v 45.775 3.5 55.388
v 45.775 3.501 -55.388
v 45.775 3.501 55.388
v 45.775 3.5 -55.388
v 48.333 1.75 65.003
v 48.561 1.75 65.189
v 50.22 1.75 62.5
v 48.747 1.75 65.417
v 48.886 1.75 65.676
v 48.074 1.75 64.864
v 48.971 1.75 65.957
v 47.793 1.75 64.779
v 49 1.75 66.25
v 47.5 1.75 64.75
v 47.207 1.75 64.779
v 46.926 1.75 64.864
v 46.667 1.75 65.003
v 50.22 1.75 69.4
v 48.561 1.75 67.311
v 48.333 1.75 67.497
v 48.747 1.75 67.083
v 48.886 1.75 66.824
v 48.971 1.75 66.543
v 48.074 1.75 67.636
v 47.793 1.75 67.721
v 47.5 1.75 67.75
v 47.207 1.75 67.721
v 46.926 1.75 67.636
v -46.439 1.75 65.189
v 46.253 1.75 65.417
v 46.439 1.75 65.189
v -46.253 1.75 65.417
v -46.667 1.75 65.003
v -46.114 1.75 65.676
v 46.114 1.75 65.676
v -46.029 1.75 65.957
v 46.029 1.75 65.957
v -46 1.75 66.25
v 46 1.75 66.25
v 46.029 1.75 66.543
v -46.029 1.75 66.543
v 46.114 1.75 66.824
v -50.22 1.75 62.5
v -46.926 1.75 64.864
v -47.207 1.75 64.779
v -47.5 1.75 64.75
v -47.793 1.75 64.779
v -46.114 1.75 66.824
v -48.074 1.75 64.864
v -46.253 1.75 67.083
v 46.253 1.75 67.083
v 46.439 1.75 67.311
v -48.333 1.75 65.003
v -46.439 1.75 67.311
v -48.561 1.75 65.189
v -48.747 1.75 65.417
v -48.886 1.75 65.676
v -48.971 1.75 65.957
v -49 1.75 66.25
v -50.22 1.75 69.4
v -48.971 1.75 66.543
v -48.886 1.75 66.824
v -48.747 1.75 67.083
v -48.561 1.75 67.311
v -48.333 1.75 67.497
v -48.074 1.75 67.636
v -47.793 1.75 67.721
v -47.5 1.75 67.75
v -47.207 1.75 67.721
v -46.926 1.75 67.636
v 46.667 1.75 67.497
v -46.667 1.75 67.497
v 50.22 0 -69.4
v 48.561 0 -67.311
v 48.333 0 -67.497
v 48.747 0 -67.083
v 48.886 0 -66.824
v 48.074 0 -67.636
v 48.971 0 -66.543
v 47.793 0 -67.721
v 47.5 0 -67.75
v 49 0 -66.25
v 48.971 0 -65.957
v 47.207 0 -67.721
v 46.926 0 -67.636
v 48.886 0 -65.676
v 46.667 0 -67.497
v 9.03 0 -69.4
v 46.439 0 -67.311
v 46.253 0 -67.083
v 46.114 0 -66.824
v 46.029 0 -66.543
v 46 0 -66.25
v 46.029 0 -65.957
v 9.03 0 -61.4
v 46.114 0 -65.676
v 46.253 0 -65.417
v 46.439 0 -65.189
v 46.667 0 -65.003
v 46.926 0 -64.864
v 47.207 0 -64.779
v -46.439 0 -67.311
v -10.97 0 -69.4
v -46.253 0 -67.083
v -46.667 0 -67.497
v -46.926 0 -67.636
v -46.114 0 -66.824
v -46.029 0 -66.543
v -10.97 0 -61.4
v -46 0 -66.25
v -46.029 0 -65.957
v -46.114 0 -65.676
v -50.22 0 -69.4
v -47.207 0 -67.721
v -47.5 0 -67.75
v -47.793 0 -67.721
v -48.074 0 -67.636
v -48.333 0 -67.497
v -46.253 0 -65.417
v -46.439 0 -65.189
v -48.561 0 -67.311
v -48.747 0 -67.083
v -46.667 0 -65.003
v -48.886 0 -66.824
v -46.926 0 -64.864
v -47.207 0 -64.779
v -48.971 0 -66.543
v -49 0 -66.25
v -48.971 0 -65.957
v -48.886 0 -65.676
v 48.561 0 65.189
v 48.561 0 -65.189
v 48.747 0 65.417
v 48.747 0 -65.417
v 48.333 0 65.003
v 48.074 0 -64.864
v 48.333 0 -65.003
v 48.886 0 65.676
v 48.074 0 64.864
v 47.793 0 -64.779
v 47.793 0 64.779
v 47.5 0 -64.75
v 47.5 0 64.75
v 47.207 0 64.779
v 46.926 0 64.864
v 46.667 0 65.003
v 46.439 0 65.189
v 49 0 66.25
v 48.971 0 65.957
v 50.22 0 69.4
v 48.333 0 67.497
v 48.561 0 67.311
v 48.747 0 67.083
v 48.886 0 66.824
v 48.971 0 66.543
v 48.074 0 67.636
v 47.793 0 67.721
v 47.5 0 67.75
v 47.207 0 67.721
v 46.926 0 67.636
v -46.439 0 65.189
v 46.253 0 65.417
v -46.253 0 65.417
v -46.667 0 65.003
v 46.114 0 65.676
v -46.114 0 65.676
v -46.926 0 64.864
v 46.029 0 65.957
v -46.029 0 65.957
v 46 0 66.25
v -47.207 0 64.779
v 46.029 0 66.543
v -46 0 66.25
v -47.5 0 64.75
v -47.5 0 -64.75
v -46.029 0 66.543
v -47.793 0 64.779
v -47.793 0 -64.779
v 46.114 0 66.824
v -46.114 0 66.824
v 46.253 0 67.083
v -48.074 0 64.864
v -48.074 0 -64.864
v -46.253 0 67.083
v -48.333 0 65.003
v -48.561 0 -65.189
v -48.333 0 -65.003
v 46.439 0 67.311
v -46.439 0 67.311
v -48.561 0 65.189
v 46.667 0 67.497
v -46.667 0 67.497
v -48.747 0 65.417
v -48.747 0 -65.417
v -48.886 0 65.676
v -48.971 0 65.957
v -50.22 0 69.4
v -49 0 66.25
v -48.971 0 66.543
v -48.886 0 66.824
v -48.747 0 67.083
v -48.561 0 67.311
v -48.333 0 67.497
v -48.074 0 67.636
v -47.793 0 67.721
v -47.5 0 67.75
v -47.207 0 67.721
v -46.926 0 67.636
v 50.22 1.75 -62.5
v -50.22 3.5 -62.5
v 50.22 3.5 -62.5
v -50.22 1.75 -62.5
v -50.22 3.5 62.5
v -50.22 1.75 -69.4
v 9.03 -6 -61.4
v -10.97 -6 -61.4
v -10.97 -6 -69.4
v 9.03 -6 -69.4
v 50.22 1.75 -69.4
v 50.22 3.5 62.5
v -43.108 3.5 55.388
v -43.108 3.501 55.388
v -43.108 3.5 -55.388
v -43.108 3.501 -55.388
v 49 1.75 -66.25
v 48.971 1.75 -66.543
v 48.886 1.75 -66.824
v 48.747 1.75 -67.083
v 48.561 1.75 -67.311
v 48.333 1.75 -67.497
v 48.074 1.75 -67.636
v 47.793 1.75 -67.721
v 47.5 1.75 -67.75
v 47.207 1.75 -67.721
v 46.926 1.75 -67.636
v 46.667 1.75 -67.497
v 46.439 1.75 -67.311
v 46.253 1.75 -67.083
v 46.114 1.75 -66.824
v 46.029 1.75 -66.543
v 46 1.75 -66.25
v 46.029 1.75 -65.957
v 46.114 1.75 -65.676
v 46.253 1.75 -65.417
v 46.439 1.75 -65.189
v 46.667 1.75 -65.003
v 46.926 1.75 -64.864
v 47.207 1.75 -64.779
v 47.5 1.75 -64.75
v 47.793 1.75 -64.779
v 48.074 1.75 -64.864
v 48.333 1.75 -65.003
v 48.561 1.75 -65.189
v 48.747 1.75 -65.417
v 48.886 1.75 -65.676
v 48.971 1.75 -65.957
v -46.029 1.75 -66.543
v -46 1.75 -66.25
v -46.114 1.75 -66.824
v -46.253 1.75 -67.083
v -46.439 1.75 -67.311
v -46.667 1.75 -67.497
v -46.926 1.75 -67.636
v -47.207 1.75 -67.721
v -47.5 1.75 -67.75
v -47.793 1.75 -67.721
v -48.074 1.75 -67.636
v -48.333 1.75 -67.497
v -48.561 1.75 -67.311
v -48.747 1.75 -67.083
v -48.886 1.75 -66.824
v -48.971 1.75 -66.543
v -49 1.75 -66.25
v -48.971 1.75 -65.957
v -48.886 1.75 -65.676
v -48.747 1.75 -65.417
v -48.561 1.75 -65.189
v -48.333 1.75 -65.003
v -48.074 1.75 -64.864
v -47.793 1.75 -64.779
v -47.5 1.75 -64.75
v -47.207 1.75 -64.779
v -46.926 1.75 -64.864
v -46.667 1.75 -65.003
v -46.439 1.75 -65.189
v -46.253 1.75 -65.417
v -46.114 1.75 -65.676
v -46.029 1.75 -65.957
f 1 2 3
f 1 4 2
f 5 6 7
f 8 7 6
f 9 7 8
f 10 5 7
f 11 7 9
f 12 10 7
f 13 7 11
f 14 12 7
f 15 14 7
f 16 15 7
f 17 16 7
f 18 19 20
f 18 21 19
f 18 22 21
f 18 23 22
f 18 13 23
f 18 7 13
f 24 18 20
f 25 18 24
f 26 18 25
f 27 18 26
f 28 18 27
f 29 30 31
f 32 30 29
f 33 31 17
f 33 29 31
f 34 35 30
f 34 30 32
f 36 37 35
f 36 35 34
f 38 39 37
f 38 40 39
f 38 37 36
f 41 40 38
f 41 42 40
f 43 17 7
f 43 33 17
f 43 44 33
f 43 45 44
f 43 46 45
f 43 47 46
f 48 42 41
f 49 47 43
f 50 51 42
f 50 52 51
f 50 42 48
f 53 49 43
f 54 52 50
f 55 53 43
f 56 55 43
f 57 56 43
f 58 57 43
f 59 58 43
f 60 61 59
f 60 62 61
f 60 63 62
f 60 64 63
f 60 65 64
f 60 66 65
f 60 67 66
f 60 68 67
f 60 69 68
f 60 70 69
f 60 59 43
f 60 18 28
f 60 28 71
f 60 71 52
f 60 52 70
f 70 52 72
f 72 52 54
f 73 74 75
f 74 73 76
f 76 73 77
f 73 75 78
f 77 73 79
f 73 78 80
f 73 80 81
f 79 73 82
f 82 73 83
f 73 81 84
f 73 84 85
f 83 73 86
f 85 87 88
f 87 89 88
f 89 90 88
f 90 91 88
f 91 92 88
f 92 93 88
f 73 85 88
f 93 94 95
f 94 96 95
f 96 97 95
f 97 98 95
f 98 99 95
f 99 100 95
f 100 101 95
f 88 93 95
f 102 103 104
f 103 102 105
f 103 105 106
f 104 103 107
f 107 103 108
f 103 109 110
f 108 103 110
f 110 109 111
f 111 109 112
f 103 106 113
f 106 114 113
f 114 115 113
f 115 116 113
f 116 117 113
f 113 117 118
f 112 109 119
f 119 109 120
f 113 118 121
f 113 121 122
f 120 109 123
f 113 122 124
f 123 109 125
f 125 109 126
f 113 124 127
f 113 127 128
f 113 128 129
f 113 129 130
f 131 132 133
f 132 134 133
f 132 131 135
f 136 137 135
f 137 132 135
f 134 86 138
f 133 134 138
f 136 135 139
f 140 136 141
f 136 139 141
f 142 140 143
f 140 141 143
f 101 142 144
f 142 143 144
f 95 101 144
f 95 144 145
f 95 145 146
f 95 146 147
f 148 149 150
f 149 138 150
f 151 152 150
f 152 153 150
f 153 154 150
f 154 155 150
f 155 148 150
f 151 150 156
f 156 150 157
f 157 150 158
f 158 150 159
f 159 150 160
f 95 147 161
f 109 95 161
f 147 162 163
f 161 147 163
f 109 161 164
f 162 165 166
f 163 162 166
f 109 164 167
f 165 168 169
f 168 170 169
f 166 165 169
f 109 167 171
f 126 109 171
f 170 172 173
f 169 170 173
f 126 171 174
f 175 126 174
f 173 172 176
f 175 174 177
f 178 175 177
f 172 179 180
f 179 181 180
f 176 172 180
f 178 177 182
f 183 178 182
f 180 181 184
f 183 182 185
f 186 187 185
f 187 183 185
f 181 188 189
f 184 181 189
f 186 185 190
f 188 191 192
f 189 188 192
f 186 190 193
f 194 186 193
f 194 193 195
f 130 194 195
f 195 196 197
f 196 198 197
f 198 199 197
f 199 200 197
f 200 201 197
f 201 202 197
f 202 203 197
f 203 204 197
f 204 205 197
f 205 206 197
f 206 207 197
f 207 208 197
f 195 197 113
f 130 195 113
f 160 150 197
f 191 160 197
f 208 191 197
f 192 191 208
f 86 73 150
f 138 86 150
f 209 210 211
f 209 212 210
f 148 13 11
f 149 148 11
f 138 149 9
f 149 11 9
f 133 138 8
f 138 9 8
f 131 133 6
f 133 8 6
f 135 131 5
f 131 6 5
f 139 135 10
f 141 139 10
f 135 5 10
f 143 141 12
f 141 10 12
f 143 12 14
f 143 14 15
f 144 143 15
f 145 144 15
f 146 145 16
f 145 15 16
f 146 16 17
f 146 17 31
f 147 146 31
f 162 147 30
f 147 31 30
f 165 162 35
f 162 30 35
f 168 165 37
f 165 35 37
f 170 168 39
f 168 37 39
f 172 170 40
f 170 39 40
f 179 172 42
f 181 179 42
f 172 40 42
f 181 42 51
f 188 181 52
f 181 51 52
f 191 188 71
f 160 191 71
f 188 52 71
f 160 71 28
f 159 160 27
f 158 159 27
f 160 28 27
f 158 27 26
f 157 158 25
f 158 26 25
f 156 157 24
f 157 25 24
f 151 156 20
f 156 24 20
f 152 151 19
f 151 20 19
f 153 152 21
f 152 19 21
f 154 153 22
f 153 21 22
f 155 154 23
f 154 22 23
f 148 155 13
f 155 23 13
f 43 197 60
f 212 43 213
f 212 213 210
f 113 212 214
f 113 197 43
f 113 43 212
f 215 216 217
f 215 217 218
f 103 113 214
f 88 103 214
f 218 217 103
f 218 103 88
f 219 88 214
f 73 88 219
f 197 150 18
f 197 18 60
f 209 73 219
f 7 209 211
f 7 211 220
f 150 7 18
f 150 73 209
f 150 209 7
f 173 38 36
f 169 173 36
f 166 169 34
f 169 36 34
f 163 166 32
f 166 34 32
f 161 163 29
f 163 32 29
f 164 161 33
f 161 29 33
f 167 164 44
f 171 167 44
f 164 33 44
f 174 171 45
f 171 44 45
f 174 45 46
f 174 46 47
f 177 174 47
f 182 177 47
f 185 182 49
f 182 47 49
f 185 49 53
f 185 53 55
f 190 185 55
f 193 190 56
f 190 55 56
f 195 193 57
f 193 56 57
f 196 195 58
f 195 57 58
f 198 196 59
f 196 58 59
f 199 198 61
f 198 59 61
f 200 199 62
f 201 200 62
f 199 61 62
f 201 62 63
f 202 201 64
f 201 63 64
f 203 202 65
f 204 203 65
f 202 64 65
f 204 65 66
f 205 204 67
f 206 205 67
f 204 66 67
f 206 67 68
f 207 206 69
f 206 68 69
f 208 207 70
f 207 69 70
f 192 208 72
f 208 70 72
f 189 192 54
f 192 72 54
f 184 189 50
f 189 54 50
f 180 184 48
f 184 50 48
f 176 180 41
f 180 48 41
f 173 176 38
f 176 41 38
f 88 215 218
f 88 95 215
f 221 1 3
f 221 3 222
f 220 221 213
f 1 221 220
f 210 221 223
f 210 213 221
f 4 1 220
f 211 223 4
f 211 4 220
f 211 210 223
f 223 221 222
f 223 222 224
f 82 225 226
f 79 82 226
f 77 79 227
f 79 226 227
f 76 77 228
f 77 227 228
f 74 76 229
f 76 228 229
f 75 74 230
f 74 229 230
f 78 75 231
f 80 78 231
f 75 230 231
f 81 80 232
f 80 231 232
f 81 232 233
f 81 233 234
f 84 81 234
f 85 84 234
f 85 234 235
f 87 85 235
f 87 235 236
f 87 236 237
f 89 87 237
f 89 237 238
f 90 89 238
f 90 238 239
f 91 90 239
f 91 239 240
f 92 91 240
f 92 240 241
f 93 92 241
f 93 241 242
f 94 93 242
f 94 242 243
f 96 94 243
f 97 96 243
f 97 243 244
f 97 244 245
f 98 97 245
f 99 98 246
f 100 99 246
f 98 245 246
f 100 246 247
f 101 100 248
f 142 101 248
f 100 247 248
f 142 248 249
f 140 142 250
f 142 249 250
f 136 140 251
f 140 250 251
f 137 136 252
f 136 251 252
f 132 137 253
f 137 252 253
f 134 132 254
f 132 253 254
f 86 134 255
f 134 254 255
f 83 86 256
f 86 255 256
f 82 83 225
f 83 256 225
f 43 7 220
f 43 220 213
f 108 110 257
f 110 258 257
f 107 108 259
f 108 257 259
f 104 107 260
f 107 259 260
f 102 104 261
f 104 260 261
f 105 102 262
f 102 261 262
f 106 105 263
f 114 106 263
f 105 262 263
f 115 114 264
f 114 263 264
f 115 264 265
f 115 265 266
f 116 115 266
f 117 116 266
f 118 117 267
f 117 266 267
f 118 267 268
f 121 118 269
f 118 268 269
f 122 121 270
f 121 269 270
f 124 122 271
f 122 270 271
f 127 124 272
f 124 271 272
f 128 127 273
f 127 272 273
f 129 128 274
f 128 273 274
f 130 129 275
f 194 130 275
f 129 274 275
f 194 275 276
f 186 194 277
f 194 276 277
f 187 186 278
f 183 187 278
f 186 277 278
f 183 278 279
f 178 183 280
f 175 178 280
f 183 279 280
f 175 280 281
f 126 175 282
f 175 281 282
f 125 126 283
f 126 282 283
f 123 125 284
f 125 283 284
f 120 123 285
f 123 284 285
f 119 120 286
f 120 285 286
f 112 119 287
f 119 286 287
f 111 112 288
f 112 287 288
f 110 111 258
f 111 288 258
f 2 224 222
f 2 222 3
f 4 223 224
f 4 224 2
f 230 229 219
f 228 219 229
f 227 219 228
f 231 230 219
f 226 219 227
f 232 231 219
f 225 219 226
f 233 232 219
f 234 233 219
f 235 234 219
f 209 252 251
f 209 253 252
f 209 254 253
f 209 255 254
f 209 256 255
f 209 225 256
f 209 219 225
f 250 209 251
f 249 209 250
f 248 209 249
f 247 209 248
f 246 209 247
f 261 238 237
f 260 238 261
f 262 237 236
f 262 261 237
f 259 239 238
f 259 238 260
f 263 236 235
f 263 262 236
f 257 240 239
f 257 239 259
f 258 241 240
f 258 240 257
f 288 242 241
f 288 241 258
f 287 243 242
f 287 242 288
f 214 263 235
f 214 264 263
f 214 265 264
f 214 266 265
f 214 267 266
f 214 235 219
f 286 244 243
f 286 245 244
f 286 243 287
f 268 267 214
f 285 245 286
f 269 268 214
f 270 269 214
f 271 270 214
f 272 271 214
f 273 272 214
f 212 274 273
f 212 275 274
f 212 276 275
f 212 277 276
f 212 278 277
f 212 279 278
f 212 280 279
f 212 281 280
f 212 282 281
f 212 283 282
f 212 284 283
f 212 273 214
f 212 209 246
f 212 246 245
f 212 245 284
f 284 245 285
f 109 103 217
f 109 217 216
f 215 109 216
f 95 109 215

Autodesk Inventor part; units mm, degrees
ref_plane "YZ Plane" through (0, 0, 0) normal (1, 0, 0) x (0, 1, 0)
ref_plane "XZ Plane" through (0, 0, 0) normal (0, 1, 0) x (-1, 0, 0)
ref_plane "XY Plane" through (0, 0, 0) normal (0, 0, 1) x (1, 0, 0)
sketch "Sketch1" plane through (0, 0, 0) normal (0, 1, 0) x (-1, 0, 0)
  line L0 (-50.22, 69.4) -> (50.22, 69.4)
  line L1 (50.22, 69.4) -> (50.22, -69.4)
  line L2 (50.22, -69.4) -> (-50.22, -69.4)
  line L3 (-50.22, -69.4) -> (-50.22, 69.4)
  line L4 (-50.22, 69.4) -> (50.22, -69.4) construction
  line L5 (50.22, 69.4) -> (-50.22, -69.4) construction
  point P0 (0, 0)
  dimension "d0" = 100.44
  dimension "d1" = 138.8
extrude "Extrusion1" add sketch "Sketch1" along normal blind 1.75
sketch "Sketch2" plane through (0, 1.75, 0) normal (0, 1, 0) x (1, 0, 0)
  line L0 (-50.22, 69.4) -> (-50.22, -69.4) construction
  line L1 (50.22, -69.4) -> (50.22, 69.4) construction
  line L2 (50.22, -62.5) -> (-50.22, -62.5)
  line L3 (-50.22, -62.5) -> (-50.22, 62.5)
  line L4 (-50.22, 62.5) -> (50.22, 62.5)
  line L5 (50.22, 62.5) -> (50.22, -62.5)
  line L6 (50.22, -62.5) -> (-50.22, 62.5) construction
  line L7 (-50.22, -62.5) -> (50.22, 62.5) construction
  point P0 (0, 0)
  dimension "d4" = 125
extrude "Extrusion2" add sketch "Sketch2" along normal blind 1.75
sketch "Sketch3" plane through (0, 1.75, 0) normal (0, 1, 0) x (1, 0, 0)
  line L0 (50.22, -62.5) -> (-50.22, -62.5) construction
  line L1 (-50.22, -62.5) -> (-50.22, -69.4) construction
  line L2 (-50.22, -69.4) -> (50.22, -69.4) construction
  line L3 (50.22, -69.4) -> (50.22, -62.5) construction
  line L4 (-50.22, 62.5) -> (50.22, 62.5) construction
  line L5 (50.22, 62.5) -> (50.22, 69.4) construction
  line L6 (50.22, 69.4) -> (-50.22, 69.4) construction
  line L7 (-50.22, 69.4) -> (-50.22, 62.5) construction
  line L8 (-50.22, -69.4) -> (50.22, -69.4) construction
  line L9 (0, -69.4) -> (0, 69.4) construction
  line L10 (50.22, 69.4) -> (-50.22, 69.4) construction
  line L11 (0, -66.25) -> (-47.5, -66.25) construction
  line L12 (0, -66.25) -> (47.5, -66.25) construction
  line L13 (-50.22, -62.5) -> (50.22, -62.5) construction
  line L14 (0, -66.25) -> (47.5, -66.25) construction
  circle A0 centre (-47.5, -66.25) radius 1.5
  circle A1 centre (47.5, -66.25) radius 1.5
  line L15 (-50.22, 69.4) -> (-50.22, -69.4) projected
  line L16 (-50.22, 0) -> (50.22, 0) construction
  line L17 (50.22, -62.5) -> (50.22, 62.5) projected
  circle A2 centre (-47.5, 66.25) radius 1.5
  circle A3 centre (47.5, 66.25) radius 1.5
  line L18 (50.22, -62.5) -> (-50.22, -62.5) projected
  line L19 (-50.22, -62.5) -> (-50.22, -69.4) projected
  line L20 (-50.22, -69.4) -> (50.22, -69.4) projected
  line L21 (50.22, -69.4) -> (50.22, -62.5) projected
  line L22 (-50.22, 62.5) -> (50.22, 62.5) projected
  line L23 (50.22, 69.4) -> (-50.22, 69.4) projected
  line L24 (50.22, 62.5) -> (50.22, 69.4) projected
  line L25 (-50.22, 69.4) -> (-50.22, 62.5) projected
  point P0 (0, 0)
  point P1 (-51, 62.5)
  dimension "d7" = 47.5
  dimension "d8" = 47.5
  dimension "d9" = 0
  dimension "d10" = 3
  dimension "d11" = 3
extrude "Extrusion3" cut sketch "Sketch3" against normal through all contours A0 | A1 | A2 | A3
sketch "Sketch4" plane through (0, 0, 0) normal (0, -1, 0) x (1, 0, 0)
  circle A0 centre (47.5, -66.25) radius 1.5 construction
  circle A1 centre (-47.5, -66.25) radius 1.5 construction
  circle A2 centre (47.5, 66.25) radius 1.5 construction
  circle A3 centre (-47.5, 66.25) radius 1.5 construction
  line L0 (-50.22, 69.4) -> (50.22, 69.4) construction
  line L1 (-50.22, -69.4) -> (-50.22, 69.4) construction
  line L2 (50.22, -69.4) -> (-50.22, -69.4) construction
  line L3 (50.22, 69.4) -> (50.22, -69.4) construction
  circle A4 centre (-47.5, -66.25) radius 1.5 construction
  line L4 (50.22, -69.4) -> (8.97, -69.4) construction
  line L5 (50.22, -69.4) -> (-50.22, -69.4) construction
  line L6 (-50.22, -69.4) -> (-10.97, -69.4) construction
  line L7 (-10.97, -69.4) -> (-10.97, -61.4)
  line L8 (-10.97, -61.4) -> (9.03, -61.4)
  line L9 (9.03, -61.4) -> (9.03, -69.4)
  line L10 (9.03, -69.4) -> (-10.97, -69.4)
  point P0 (0, 0)
  dimension "d21" = 41.25
  dimension "d22" = 39.25
  dimension "d23" = 8
  dimension "d24" = 20
extrude "Extrusion4" add sketch "Sketch4" along normal blind 6
sketch "Sketch5" plane through (0, 3.5, 0) normal (0, 1, 0) x (1, 0, 0)
  line L0 (50.22, 62.5) -> (-50.22, 62.5) construction
  line L1 (-50.22, 62.5) -> (-50.22, -62.5) construction
  line L2 (-50.22, -62.5) -> (50.22, -62.5) construction
  line L3 (50.22, -62.5) -> (50.22, 62.5) construction
  line L4 (-50.22, 62.5) -> (-50.22, -62.5) construction
  line L5 (-50.22, 62.5) -> (-50.22, 55.388) construction
  line L6 (-50.22, 55.388) -> (-43.108, 55.388) construction
  line L7 (50.22, 62.5) -> (50.22, 55.388) construction
  line L8 (50.22, -62.5) -> (50.22, 62.5) construction
  line L9 (50.22, 55.388) -> (41.33, 55.388) construction
  line L10 (-50.22, -62.5) -> (50.22, -62.5) construction
  line L11 (50.22, -62.5) -> (50.22, -55.388) construction
  line L12 (50.22, -55.388) -> (41.33, -55.388) construction
  line L13 (-50.22, -62.5) -> (-50.22, -69.4) construction
  line L14 (-50.22, -62.5) -> (-50.22, -55.388) construction
  line L15 (-50.22, -55.388) -> (-43.108, -55.388) construction
  line L16 (-43.108, 55.388) -> (45.775, 55.388)
  line L17 (45.775, 55.388) -> (45.775, -55.388)
  line L18 (45.775, -55.388) -> (-43.108, -55.388)
  line L19 (-43.108, -55.388) -> (-43.108, 55.388)
  point P0 (0, 0)
  dimension "d25" = 7.112
  dimension "d26" = 7.112
  dimension "d27" = 7.112
  dimension "d28" = 8.89
  dimension "d29" = 7.112
  dimension "d30" = 8.89
  dimension "d31" = 7.112
  dimension "d32" = 7.112
extrude "Extrusion5" add sketch "Sketch5" along normal blind 0.001
equation "\"d26\" = d25"
equation "\"d27\" = d25"
equation "\"d29\" = d25"
equation "\"d30\" = d28"
equation "\"d31\" = d25"
equation "\"d32\" = d25"
properties part number "E-Paper Display"
